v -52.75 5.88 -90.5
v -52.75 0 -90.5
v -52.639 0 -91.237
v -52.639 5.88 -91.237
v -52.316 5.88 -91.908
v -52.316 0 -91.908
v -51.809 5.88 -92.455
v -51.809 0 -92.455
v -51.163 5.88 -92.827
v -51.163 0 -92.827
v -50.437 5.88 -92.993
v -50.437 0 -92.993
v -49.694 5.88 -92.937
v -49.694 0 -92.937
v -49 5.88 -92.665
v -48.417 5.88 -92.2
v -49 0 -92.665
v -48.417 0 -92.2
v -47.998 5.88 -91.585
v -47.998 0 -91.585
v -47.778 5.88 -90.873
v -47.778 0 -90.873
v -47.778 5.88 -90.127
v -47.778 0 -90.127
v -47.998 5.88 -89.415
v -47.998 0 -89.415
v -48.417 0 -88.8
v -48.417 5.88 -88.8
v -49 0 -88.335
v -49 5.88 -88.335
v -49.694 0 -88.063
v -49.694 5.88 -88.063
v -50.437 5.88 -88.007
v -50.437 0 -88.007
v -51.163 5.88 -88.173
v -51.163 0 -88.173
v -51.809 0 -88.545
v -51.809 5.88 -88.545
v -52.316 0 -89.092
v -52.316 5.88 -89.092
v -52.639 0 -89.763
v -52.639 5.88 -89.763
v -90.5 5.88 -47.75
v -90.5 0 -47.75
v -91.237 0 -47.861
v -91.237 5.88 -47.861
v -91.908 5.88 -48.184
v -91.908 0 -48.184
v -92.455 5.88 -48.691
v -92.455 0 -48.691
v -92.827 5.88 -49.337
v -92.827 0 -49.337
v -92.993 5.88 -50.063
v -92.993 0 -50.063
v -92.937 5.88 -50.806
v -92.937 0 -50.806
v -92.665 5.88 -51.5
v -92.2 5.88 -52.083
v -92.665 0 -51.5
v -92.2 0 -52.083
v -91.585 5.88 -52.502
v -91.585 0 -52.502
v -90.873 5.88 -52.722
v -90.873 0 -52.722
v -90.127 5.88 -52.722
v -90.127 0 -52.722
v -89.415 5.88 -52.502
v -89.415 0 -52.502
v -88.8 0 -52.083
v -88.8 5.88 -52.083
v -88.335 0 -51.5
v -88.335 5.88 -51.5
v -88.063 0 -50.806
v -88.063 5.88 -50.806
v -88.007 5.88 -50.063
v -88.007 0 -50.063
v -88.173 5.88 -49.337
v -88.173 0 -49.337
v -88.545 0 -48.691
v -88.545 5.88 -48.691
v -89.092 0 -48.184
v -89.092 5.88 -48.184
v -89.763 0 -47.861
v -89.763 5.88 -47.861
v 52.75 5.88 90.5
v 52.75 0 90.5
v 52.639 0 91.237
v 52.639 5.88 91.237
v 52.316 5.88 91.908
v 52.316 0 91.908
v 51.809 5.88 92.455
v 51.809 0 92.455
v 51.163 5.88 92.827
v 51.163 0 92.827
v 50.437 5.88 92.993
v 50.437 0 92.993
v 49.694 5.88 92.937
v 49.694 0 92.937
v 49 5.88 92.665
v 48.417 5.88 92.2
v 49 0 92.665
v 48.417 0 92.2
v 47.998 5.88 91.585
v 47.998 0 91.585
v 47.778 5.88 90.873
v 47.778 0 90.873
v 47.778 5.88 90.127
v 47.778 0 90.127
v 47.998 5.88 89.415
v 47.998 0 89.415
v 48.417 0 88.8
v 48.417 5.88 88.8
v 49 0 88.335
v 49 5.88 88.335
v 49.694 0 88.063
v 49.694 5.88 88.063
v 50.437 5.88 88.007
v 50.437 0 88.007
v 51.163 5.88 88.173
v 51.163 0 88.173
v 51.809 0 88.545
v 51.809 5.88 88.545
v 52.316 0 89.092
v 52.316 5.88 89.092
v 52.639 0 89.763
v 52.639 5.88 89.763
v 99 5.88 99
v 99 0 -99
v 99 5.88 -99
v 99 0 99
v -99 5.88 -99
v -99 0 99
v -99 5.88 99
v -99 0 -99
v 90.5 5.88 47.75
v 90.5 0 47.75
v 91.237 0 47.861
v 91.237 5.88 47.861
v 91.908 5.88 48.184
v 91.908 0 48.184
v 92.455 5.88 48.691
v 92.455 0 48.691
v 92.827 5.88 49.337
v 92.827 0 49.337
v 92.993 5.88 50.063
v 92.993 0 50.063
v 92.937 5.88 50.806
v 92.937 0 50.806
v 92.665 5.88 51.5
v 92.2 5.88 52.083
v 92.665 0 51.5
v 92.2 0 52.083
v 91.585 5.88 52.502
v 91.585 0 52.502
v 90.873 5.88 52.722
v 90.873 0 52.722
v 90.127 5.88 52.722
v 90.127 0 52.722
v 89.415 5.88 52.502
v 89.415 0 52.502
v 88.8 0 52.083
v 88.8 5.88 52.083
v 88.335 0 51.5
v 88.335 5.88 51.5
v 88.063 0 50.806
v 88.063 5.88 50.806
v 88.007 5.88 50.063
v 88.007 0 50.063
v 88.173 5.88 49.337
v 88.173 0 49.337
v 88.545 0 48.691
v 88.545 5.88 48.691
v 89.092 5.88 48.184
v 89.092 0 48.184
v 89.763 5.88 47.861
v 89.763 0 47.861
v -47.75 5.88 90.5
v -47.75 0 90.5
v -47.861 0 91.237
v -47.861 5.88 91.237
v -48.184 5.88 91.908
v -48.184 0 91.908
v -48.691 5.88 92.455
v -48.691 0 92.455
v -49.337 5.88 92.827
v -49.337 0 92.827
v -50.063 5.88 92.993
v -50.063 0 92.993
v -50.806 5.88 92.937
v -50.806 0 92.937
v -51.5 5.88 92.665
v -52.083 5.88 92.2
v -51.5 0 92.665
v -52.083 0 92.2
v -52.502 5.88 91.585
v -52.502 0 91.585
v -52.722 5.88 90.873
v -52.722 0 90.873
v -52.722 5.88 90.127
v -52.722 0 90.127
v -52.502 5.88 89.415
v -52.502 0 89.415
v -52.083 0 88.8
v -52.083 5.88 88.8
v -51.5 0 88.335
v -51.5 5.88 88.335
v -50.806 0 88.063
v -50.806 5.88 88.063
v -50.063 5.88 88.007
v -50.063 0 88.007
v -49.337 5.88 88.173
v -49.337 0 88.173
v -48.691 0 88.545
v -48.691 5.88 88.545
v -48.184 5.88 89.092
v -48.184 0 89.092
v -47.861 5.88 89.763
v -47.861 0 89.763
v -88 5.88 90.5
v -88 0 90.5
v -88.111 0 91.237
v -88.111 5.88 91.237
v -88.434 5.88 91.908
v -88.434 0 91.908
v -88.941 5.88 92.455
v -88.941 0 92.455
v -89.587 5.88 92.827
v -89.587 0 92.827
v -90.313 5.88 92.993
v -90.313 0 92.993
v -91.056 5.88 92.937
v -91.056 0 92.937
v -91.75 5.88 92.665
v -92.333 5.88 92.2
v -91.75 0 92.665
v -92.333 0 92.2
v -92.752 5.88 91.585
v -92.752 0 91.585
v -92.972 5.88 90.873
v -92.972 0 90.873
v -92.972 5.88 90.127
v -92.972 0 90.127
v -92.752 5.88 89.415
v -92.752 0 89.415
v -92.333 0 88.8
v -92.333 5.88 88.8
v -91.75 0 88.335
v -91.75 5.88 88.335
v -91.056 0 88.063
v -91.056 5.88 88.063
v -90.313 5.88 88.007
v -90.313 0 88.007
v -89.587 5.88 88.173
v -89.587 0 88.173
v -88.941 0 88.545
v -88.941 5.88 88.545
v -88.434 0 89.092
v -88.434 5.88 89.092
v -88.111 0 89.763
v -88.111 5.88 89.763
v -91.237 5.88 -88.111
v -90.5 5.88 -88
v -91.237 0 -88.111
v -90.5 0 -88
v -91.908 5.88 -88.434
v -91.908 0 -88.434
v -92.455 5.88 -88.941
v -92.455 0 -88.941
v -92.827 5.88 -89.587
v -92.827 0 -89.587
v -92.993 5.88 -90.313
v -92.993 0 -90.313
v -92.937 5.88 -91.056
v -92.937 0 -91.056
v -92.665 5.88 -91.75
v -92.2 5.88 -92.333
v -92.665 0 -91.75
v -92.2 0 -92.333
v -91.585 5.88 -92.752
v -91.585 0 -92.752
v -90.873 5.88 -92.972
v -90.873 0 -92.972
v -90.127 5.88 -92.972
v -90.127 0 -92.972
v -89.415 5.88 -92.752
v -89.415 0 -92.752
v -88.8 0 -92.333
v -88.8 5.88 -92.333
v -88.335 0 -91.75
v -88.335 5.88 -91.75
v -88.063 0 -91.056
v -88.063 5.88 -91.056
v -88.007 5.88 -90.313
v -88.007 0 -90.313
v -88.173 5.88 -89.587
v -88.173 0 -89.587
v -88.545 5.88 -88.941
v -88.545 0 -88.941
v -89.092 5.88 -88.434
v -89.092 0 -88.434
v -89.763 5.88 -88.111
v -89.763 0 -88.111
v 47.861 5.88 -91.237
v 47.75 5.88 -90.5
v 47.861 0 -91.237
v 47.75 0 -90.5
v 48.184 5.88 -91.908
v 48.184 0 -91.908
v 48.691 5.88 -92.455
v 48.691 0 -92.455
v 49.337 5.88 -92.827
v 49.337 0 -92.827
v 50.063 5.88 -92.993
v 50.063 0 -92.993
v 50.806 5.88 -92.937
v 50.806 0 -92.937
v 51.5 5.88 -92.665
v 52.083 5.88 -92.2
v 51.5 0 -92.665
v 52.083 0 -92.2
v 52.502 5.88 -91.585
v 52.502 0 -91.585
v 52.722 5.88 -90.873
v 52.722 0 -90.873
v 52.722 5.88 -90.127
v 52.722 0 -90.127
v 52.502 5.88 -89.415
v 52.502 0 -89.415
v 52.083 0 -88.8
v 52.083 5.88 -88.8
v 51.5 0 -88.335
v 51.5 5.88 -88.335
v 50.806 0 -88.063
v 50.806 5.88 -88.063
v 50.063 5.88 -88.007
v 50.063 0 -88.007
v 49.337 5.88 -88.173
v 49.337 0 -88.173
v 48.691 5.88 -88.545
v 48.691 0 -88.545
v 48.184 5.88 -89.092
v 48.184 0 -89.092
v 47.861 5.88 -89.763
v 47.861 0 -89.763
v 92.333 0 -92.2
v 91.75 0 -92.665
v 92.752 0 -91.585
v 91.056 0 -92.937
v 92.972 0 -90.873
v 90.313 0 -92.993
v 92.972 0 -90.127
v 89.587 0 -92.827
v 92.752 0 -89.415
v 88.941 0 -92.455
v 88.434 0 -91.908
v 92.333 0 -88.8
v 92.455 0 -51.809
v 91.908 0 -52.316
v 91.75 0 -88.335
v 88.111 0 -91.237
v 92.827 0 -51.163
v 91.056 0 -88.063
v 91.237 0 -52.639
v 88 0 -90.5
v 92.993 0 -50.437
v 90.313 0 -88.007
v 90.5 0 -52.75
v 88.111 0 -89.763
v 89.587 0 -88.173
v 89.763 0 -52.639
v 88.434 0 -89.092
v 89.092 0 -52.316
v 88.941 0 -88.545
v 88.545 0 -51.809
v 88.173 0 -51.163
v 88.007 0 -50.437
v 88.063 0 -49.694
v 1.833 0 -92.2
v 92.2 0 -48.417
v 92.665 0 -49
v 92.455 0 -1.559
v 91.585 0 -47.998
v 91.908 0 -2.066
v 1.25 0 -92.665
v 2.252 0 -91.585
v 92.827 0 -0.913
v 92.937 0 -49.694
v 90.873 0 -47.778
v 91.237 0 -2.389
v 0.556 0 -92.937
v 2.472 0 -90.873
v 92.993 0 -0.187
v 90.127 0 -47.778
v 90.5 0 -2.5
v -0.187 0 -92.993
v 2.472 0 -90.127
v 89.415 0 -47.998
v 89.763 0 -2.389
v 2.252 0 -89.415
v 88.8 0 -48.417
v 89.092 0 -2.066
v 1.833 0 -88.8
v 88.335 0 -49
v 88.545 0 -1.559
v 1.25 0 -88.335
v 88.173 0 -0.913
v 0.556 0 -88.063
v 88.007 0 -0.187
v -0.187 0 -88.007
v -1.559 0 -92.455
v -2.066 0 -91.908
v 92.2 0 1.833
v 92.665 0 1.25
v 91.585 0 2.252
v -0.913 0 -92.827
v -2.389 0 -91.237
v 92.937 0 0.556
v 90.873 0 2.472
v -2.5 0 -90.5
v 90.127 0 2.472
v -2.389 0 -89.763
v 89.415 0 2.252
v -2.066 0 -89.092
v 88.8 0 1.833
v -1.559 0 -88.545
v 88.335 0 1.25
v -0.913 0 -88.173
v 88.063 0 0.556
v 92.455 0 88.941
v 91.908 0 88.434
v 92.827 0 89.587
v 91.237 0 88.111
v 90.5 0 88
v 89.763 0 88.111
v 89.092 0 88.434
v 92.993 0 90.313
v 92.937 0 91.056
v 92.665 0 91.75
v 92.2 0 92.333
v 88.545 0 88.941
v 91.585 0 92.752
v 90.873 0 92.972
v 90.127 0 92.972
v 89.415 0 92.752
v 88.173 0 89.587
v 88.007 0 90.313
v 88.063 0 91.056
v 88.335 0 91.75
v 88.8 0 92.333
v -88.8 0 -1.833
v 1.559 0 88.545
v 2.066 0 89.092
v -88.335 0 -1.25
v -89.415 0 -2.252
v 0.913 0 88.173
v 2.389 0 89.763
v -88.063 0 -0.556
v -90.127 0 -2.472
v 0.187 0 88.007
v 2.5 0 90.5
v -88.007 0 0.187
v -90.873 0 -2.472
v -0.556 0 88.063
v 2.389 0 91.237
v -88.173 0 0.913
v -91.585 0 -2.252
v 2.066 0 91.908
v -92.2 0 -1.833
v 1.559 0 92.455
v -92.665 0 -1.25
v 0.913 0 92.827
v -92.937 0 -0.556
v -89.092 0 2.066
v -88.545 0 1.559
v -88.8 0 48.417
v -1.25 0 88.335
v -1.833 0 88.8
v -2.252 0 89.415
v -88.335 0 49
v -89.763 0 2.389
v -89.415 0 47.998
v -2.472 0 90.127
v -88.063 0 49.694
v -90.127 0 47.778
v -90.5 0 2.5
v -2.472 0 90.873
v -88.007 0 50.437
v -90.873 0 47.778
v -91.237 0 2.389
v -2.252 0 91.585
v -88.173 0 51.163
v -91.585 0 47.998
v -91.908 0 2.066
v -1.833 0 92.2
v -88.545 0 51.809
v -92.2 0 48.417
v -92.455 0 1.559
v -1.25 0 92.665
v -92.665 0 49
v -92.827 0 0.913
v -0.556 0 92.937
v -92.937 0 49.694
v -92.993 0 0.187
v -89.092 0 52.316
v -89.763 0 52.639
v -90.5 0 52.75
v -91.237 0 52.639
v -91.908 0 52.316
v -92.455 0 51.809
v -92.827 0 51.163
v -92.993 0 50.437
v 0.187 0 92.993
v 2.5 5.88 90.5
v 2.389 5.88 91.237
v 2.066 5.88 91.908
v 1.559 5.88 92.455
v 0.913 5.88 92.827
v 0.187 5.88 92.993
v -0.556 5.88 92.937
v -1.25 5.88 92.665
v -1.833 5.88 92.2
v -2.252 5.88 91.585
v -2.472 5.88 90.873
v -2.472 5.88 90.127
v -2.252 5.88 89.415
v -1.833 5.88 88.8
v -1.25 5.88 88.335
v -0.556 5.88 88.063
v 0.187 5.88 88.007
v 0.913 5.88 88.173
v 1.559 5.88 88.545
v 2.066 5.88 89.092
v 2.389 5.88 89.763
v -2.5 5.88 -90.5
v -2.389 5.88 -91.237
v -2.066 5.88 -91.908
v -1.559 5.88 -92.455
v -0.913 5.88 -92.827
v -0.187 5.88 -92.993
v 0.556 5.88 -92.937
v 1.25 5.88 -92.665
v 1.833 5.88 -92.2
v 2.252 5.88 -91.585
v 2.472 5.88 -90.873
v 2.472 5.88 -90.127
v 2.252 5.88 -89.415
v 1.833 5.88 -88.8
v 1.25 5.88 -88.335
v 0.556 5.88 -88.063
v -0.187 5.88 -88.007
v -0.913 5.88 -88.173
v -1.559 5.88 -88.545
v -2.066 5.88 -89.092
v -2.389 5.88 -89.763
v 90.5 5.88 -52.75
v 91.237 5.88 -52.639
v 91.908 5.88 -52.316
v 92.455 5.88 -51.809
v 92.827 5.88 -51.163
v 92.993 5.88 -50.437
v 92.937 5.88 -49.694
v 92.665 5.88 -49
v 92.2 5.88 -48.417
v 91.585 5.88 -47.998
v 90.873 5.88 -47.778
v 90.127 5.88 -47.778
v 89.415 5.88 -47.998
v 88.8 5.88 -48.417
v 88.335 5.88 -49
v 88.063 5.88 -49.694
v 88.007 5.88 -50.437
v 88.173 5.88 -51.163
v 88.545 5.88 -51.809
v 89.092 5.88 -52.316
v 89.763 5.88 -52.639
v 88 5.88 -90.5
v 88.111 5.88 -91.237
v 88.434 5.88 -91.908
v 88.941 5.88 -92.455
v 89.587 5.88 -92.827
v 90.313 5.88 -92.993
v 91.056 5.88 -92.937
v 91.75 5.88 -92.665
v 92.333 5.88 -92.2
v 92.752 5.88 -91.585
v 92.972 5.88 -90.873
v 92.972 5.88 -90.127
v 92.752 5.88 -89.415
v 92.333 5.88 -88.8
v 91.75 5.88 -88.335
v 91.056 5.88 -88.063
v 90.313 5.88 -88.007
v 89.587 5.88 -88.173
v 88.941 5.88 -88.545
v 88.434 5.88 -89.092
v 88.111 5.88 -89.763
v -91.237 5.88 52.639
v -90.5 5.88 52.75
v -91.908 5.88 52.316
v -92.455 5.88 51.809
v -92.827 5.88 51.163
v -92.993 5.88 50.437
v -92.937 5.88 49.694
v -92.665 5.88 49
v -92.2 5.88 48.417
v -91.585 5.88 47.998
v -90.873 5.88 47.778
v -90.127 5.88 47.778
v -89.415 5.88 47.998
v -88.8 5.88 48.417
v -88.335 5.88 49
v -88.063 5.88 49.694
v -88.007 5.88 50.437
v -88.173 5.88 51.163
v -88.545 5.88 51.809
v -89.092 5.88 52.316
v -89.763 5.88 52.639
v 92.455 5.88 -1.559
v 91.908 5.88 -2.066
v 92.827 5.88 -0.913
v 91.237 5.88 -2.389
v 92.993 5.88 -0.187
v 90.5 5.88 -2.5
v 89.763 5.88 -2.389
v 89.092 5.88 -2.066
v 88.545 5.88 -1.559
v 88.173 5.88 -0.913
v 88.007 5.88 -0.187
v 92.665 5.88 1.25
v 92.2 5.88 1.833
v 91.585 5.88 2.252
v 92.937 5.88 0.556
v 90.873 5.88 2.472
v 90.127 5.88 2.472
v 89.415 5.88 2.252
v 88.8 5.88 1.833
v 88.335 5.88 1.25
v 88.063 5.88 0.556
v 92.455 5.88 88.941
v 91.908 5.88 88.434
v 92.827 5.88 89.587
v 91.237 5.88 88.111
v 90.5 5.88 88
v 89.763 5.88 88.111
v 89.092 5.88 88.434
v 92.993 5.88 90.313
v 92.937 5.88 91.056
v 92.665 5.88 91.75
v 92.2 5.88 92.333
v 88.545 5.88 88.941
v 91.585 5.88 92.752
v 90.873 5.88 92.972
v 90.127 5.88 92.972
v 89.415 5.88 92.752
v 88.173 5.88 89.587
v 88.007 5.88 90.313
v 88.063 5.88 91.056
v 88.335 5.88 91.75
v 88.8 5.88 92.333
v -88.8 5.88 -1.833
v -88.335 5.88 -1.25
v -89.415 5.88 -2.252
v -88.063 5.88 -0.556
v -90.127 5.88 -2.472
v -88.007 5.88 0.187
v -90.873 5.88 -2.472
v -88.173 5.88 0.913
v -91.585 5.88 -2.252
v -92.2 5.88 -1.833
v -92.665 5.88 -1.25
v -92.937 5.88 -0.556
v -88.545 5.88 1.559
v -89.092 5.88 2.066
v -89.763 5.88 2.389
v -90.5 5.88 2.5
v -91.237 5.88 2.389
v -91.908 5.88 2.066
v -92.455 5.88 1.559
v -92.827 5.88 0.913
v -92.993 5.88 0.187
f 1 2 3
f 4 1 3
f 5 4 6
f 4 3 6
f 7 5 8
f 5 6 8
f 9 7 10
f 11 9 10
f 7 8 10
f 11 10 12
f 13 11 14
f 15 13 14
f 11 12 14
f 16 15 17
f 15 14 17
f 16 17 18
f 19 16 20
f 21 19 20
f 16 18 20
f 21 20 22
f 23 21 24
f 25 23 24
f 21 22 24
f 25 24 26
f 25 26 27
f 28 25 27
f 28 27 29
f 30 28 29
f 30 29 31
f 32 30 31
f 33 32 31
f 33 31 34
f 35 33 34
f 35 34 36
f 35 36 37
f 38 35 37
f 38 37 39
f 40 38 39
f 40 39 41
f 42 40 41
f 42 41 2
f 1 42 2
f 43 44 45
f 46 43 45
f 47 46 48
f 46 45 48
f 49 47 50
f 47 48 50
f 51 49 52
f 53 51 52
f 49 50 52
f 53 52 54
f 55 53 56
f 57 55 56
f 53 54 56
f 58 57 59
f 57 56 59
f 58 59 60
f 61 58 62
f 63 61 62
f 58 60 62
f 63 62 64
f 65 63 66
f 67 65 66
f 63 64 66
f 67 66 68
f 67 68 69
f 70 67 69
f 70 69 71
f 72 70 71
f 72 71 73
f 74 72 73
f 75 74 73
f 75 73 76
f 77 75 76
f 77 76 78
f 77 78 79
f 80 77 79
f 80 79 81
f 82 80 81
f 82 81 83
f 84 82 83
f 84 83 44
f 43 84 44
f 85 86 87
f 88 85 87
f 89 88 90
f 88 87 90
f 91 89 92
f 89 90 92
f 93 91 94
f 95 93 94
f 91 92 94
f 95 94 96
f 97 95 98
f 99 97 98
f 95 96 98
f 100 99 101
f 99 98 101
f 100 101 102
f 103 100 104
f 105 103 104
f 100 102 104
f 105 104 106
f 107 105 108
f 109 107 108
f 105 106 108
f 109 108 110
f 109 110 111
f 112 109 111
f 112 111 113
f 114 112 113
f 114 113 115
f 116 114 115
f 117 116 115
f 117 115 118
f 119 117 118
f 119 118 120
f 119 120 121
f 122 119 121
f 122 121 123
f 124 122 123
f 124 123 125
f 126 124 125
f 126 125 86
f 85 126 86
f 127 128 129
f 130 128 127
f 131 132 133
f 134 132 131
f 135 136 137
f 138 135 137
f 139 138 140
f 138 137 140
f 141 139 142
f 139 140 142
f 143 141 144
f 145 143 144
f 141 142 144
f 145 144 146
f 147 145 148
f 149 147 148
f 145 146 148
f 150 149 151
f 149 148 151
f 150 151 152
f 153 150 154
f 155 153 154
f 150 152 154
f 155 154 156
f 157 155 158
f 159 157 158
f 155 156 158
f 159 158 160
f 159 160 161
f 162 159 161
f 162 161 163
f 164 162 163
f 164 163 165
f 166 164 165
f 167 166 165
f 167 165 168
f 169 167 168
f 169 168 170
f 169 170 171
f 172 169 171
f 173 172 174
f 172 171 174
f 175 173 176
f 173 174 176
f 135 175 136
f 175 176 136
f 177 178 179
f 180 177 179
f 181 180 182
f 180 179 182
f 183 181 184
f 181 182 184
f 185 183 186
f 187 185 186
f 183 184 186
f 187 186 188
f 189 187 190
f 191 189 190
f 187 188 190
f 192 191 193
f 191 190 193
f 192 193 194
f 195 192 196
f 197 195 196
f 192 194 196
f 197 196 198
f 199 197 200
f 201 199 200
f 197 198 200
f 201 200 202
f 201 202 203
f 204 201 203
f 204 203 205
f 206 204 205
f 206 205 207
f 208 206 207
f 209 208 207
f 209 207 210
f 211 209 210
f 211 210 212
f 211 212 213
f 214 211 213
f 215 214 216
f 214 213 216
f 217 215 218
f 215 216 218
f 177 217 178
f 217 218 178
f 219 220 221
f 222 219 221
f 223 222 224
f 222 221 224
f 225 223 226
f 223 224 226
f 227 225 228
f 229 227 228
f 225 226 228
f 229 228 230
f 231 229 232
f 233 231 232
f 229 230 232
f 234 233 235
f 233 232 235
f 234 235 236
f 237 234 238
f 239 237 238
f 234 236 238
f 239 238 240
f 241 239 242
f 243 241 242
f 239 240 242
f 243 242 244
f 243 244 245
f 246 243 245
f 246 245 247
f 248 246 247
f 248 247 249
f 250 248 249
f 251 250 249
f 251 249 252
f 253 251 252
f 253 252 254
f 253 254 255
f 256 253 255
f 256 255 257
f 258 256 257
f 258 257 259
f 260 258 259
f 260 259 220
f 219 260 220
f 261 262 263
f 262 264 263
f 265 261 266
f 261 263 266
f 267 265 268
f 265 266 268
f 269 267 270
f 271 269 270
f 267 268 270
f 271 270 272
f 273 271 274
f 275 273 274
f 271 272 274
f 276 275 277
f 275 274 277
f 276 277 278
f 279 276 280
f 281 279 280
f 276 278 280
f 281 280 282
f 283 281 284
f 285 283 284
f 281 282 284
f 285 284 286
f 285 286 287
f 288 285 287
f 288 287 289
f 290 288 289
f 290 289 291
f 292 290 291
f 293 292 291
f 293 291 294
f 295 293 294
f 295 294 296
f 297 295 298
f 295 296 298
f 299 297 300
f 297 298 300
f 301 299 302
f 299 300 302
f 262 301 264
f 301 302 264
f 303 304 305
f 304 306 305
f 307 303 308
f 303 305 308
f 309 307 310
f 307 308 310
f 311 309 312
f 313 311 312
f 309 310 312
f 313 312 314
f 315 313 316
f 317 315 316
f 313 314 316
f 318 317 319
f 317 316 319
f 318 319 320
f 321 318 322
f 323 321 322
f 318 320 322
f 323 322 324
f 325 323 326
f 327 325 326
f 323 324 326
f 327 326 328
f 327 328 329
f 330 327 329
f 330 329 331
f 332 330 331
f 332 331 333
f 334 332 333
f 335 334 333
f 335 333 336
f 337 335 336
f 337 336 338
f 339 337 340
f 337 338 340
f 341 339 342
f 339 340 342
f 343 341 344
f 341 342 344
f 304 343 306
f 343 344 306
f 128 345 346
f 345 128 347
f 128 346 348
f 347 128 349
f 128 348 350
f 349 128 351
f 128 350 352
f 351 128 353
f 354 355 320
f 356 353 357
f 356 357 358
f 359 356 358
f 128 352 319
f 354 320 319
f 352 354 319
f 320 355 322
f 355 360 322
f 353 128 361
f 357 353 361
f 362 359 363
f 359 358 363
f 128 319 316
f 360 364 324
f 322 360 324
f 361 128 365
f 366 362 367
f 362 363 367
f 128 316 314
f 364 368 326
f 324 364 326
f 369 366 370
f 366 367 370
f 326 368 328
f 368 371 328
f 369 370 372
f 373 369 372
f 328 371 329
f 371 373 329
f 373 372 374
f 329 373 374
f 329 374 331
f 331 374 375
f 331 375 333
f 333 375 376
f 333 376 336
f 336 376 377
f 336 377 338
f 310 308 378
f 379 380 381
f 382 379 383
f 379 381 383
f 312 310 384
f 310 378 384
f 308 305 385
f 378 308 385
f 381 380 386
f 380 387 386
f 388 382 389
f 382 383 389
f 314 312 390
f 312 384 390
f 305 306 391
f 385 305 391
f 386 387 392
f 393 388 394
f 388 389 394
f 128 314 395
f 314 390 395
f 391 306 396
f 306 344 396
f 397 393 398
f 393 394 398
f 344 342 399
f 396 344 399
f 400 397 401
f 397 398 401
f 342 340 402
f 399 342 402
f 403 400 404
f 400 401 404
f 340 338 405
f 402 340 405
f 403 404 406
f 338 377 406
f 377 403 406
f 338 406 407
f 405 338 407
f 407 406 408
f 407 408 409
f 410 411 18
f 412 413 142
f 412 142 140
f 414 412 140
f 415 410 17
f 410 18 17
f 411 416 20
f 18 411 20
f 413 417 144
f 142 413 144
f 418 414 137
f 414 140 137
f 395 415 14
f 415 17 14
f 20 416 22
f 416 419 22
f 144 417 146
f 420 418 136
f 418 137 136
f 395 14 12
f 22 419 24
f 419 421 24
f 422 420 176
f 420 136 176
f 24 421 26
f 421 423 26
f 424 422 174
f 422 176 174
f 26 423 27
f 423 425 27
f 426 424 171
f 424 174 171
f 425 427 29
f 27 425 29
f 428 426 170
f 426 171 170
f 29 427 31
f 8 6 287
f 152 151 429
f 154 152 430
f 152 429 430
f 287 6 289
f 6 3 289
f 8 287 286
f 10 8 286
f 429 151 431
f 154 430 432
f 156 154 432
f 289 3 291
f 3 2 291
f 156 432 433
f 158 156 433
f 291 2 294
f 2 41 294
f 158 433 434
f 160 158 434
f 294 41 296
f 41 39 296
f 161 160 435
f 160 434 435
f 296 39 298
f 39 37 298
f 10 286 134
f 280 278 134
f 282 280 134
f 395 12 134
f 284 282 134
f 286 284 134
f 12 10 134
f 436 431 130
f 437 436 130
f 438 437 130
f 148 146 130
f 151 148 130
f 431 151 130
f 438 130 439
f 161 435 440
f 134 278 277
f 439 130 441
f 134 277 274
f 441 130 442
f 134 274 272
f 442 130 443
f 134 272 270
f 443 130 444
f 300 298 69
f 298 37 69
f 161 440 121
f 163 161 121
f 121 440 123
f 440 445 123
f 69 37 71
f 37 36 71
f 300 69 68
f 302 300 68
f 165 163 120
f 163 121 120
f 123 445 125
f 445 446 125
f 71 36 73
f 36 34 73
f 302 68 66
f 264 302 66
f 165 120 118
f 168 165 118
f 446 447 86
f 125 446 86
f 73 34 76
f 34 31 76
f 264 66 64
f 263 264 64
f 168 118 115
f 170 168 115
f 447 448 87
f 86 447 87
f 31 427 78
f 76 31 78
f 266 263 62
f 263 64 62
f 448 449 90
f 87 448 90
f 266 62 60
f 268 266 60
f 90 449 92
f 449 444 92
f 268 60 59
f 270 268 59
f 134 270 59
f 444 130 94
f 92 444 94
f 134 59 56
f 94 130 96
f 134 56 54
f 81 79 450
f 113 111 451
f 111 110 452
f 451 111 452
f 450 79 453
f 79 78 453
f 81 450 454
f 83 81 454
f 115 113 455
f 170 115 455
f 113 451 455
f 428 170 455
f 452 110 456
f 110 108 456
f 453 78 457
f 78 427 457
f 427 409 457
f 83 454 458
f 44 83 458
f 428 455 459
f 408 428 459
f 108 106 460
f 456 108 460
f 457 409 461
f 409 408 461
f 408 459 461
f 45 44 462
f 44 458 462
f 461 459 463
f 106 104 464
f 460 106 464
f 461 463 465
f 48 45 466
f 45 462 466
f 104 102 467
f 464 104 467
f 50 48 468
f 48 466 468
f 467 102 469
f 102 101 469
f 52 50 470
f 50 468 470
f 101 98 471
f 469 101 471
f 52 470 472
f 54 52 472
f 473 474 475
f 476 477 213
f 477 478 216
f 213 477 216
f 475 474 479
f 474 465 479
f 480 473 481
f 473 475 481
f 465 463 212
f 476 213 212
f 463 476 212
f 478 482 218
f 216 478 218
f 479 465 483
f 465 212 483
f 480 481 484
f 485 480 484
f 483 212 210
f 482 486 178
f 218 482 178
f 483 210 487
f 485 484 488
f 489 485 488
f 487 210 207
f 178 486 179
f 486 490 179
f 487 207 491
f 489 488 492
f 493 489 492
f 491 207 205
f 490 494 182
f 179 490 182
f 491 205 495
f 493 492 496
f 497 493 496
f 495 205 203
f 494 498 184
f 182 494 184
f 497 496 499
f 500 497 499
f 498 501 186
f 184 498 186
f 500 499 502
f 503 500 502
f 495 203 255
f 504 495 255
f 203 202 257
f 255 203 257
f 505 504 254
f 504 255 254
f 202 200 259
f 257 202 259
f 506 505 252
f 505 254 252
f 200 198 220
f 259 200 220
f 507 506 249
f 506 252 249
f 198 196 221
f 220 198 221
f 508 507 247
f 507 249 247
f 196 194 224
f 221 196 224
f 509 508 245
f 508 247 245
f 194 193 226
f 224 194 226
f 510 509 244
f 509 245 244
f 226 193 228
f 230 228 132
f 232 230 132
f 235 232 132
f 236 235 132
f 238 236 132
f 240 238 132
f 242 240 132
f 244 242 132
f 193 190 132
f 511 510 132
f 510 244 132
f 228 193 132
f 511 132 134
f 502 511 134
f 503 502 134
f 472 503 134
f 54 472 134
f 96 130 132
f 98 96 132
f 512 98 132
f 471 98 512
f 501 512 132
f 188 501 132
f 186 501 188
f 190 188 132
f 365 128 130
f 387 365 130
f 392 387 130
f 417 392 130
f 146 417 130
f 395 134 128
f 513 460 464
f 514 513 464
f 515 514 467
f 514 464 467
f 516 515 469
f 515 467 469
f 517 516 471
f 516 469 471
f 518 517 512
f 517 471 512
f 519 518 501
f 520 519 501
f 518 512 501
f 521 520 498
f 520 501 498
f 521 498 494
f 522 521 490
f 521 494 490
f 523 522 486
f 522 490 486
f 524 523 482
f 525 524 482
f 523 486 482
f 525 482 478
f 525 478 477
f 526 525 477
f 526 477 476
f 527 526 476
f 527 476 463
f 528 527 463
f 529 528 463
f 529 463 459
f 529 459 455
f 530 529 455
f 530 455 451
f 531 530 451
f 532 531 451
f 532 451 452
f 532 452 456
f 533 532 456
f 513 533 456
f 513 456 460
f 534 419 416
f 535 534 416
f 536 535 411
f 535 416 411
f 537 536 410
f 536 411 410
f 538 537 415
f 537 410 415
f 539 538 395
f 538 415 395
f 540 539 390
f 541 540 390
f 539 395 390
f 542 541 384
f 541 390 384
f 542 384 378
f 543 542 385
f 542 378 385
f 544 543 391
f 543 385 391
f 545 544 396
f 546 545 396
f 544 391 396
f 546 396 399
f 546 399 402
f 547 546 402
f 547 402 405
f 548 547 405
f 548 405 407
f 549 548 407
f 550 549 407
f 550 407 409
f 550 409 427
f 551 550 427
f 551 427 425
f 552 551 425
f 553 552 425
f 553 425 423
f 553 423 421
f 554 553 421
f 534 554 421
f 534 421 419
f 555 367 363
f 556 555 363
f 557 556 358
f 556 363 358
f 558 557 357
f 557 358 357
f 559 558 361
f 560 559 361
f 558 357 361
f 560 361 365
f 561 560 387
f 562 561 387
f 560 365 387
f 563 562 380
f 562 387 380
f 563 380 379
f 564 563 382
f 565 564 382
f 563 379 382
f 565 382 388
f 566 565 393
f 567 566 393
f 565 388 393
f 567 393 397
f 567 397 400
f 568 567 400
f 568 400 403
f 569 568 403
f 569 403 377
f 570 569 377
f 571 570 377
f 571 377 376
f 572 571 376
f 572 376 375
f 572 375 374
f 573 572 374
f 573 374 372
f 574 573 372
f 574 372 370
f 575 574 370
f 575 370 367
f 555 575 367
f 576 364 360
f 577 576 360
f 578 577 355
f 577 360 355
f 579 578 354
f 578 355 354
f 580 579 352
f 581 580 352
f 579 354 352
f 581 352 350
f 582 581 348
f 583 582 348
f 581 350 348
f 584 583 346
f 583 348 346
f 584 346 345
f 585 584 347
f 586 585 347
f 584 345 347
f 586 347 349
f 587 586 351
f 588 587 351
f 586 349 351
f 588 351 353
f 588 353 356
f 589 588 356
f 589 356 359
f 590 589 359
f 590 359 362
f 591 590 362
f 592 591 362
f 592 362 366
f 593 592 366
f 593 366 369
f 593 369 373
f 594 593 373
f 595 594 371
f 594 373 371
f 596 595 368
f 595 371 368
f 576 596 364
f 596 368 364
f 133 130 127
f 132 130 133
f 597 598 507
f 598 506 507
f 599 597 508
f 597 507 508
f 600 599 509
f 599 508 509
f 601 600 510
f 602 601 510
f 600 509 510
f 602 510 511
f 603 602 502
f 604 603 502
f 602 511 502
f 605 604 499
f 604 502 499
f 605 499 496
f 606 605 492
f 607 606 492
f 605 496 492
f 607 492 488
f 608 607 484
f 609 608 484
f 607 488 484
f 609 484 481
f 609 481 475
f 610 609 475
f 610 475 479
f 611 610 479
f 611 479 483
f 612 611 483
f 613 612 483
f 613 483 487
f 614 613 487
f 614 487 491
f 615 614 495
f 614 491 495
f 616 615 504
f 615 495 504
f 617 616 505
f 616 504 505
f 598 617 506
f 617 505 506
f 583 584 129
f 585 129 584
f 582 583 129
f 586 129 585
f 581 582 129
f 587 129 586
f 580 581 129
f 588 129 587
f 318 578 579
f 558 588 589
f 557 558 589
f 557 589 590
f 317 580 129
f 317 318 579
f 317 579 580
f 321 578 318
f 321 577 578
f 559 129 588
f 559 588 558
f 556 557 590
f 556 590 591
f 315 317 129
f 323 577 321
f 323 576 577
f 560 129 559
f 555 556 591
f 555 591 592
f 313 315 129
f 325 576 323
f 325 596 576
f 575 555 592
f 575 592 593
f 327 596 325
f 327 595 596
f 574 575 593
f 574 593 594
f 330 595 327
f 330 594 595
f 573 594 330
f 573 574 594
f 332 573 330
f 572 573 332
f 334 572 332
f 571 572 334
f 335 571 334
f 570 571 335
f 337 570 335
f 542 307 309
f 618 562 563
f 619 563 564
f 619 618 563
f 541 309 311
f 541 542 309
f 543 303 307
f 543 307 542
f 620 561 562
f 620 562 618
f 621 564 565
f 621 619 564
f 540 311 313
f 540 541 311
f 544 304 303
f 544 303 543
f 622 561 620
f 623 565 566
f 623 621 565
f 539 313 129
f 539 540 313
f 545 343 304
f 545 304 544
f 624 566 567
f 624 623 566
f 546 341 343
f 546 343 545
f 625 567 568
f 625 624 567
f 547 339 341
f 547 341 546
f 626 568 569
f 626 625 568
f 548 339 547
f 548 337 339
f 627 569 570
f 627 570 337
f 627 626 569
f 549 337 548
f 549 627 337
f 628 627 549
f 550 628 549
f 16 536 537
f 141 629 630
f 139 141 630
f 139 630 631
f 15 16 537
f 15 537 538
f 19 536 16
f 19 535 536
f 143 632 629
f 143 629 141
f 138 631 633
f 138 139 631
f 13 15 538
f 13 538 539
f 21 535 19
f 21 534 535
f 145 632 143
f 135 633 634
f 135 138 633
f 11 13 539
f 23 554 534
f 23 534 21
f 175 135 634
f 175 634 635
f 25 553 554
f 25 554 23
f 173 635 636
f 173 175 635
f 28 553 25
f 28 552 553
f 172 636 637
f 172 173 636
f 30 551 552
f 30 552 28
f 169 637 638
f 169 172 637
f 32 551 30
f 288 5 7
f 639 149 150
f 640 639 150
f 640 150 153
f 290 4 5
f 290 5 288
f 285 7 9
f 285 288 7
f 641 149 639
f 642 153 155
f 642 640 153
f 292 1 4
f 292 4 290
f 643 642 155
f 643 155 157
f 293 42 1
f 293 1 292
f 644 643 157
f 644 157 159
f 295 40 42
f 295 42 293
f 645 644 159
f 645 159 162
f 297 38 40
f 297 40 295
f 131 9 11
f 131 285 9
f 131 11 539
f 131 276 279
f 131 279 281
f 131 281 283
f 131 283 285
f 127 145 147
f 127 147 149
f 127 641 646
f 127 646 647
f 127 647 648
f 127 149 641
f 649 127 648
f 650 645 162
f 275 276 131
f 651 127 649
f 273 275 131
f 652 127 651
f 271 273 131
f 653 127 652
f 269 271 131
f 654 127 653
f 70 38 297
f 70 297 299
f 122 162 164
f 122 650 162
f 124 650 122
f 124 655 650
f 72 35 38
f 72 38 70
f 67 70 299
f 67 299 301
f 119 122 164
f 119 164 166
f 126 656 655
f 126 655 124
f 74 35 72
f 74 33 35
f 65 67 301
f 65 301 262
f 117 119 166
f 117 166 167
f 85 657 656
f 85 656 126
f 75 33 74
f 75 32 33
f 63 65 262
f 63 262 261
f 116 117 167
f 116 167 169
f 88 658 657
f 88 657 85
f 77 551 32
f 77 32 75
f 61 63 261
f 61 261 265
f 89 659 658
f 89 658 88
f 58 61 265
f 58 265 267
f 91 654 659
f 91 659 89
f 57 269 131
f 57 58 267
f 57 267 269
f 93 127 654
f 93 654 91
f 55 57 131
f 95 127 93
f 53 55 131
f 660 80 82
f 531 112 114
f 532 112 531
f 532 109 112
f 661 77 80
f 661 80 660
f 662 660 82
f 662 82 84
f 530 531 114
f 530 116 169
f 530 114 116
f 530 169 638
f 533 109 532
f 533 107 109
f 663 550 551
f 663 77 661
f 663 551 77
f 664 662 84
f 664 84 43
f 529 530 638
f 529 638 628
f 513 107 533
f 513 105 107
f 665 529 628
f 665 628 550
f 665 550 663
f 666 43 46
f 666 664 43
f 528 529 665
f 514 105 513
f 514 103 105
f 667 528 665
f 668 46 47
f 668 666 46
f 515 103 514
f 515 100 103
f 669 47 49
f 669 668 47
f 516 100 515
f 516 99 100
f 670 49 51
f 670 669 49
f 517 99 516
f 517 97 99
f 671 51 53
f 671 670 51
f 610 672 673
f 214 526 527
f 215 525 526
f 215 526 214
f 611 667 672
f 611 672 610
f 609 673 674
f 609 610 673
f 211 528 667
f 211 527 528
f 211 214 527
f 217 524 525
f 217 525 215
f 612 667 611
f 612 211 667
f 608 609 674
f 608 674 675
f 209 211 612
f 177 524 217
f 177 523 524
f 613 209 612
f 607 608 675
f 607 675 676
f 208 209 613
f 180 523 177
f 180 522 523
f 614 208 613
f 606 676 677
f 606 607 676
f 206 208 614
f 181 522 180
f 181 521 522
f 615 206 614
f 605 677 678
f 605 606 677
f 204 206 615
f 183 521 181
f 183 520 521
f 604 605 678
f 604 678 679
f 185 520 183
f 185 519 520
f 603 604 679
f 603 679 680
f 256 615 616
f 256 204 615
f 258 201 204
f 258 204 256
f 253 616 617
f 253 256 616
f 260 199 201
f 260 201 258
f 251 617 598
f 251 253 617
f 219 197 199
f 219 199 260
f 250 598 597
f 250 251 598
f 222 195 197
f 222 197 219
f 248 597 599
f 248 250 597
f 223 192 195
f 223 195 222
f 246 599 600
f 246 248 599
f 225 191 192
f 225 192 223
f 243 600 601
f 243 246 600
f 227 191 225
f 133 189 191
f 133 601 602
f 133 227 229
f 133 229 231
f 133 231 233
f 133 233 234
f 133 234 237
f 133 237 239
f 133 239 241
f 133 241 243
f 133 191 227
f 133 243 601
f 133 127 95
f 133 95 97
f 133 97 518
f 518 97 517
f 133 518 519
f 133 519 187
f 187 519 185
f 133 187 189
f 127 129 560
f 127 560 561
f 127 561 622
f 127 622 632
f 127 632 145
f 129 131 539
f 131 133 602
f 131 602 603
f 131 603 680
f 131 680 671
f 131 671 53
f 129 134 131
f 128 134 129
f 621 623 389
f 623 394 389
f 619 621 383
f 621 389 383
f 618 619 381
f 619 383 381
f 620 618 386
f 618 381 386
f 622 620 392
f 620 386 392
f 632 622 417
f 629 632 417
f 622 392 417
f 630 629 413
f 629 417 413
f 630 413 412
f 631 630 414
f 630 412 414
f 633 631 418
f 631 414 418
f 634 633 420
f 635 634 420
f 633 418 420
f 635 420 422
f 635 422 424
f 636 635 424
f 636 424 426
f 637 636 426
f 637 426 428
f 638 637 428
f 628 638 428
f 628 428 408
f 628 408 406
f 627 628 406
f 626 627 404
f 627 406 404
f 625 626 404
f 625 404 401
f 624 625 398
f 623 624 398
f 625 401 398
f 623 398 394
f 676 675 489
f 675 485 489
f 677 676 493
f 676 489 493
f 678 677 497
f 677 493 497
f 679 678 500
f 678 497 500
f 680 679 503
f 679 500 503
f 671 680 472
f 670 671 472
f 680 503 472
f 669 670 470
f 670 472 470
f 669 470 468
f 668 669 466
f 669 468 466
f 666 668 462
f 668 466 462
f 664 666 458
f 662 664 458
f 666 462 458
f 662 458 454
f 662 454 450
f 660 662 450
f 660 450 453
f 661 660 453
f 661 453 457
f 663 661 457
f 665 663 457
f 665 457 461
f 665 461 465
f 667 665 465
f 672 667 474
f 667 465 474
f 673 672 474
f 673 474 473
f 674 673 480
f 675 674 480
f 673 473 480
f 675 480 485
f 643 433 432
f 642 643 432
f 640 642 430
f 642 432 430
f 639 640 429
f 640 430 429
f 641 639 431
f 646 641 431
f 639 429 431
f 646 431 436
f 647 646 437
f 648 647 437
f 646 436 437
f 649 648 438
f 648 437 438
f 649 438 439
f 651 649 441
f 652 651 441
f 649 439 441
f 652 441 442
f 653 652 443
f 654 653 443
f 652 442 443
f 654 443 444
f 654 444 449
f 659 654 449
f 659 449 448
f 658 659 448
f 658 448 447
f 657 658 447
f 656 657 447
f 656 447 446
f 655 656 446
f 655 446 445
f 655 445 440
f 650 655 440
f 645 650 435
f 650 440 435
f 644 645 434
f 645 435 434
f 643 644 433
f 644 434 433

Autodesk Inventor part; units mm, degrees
ref_plane "YZ Plane" through (0, 0, 0) normal (1, 0, 0) x (0, 1, 0)
ref_plane "XZ Plane" through (0, 0, 0) normal (0, 1, 0) x (-1, 0, 0)
ref_plane "XY Plane" through (0, 0, 0) normal (0, 0, 1) x (1, 0, 0)
sketch "Sketch1" plane through (0, 0, 0) normal (0, 1, 0) x (-1, 0, 0)
  line L0 (99, -99) -> (-99, -99)
  line L1 (-99, -99) -> (-99, 99)
  line L2 (-99, 99) -> (99, 99)
  line L3 (99, 99) -> (99, -99)
  line L4 (99, -99) -> (-99, 99) construction
  line L5 (-99, -99) -> (99, 99) construction
  point P0 (0, 0)
  dimension "d0" = 198
  dimension "d1" = 198
extrude "Extrusion1" add sketch "Sketch1" along normal blind 5.88
sketch "Sketch2" plane through (0, 5.88, 0) normal (0, 1, 0) x (1, 0, 0)
  circle A0 centre (-76.175, -76.175) radius 5
  line L0 (99, 99) -> (-99, 99) projected
  line L1 (-99, 99) -> (-99, -99) projected
  line L2 (82.175, -82.175) -> (-82.175, -82.175)
  line L3 (-82.175, -82.175) -> (-82.175, 82.175)
  line L4 (-82.175, 82.175) -> (82.175, 82.175)
  line L5 (82.175, 82.175) -> (82.175, -82.175)
  line L6 (82.175, -82.175) -> (-82.175, 82.175) construction
  line L7 (-82.175, -82.175) -> (82.175, 82.175) construction
  line L8 (75, -75) -> (-75, -75)
  line L9 (-75, -75) -> (-75, 75)
  line L10 (-75, 75) -> (75, 75)
  line L11 (75, 75) -> (75, -75)
  line L12 (75, -75) -> (-75, 75) construction
  line L13 (-75, -75) -> (75, 75) construction
  circle A1 centre (-76.175, -76.175) radius 6
  circle A2 centre (-90.5875, 62.75) radius 2.5
  line L14 (0, 0) -> (-75, 0)
  circle A3 centre (-90.5875, -62.75) radius 2.5
  circle A4 centre (-62.75, -90.5875) radius 2.5
  circle A5 centre (62.75, -90.5875) radius 2.5
  circle A6 centre (90.5875, -62.75) radius 2.5
  circle A7 centre (90.5875, 62.75) radius 2.5
  circle A8 centre (62.75, 90.5875) radius 2.5
  circle A9 centre (-62.75, 90.5875) radius 2.5
  dimension "d4" = 10
  dimension "d7" = 16.825
  dimension "d8" = 16.825
  dimension "d9" = 150
  dimension "d10" = 150
  dimension "d11" = 6
  dimension "d12" = 12
  dimension "d13" = 5
  dimension "d14" = 8.4125
  dimension "d15" = 62.75
  dimension "d18" = 360
extrude "Extrusion2" [suppressed]
sketch "Sketch4" plane through (0, 0, 0) normal (0, -1, 0) x (1, 0, 0)
  line L0 (-80.5, -80.5) -> (80.5, -80.5)
  line L1 (80.5, -80.5) -> (80.5, 80.5)
  line L2 (80.5, 80.5) -> (-80.5, 80.5)
  line L3 (-80.5, 80.5) -> (-80.5, -80.5)
  line L4 (-80.5, -80.5) -> (80.5, 80.5) construction
  line L5 (80.5, -80.5) -> (-80.5, 80.5) construction
  line L6 (-100.5, -100.5) -> (100.5, -100.5)
  line L7 (100.5, -100.5) -> (100.5, 100.5)
  line L8 (100.5, 100.5) -> (-100.5, 100.5)
  line L9 (-100.5, 100.5) -> (-100.5, -100.5)
  line L10 (-100.5, -100.5) -> (100.5, 100.5) construction
  line L11 (100.5, -100.5) -> (-100.5, 100.5) construction
  circle A0 centre (-50.25, 90.5) radius 2.5
  line L12 (0, 0) -> (0, 100.5)
  circle A1 centre (50.25, 90.5) radius 2.5
  circle A2 centre (-90.5, 90.5) radius 2.5
  circle A3 centre (0, 90.5) radius 2.5
  circle A4 centre (90.5, 90.5) radius 2.5
  point P0 (0, 0)
  dimension "d20" = 201
  dimension "d21" = 201
  dimension "d22" = 20
  dimension "d23" = 20
  dimension "d24" = 5
  dimension "d25" = 50.25
  dimension "d26" = 10
  dimension "d32" = 5
  dimension "d33" = 10
  dimension "d34" = 5
  dimension "d35" = 10
extrude "Extrusion3" cut sketch "Sketch4" against normal blind 10 contours A3 L12 | L12 A3 | A0 | A1 | A2
pattern_circular "Circular Pattern1" count 4 over 360 about axis through (0, -10, 0) along (0, 1, 0) of "Extrusion3"
equation "\"d2\" = thick_acrylic"
equation "\"d4\" = stopper_diameter"
equation "\"d7\" = reservoir_overlap - 2 * sm_thickness"
equation "\"d8\" = reservoir_overlap - 2 * sm_thickness"
equation "\"d9\" = bed_x"
equation "\"d10\" = bed_y"
equation "\"d13\" = m5_diameter"
equation "\"d14\" = -sm_thickness + 0.5 * reservoir_overlap"
equation "\"d15\" = 0.25 * tray_y"
equation "\"d5\" = thick_acrylic"
equation "\"d20\" = reservoir_x"
equation "\"d21\" = reservoir_y"
equation "\"d22\" = reservoir_overlap"
equation "\"d23\" = reservoir_overlap"
equation "\"d24\" = m5_diameter"
equation "\"d25\" = 0.25 * reservoir_x"
equation "\"d26\" = 0.5 * reservoir_overlap"
equation "\"d32\" = m5_diameter"
equation "\"d33\" = 0.5 * reservoir_overlap"
equation "\"d34\" = m5_diameter"
equation "\"d35\" = 0.5 * reservoir_overlap"
equation "\"sm_thickness\" = 1.5875"
equation "\"thick_acrylic\" = 5.88"
equation "\"thin_acrylic\" = 3.15"
equation "\"clear_acrylic\" = 3.15"
equation "\"wood_thickness\" = 6.72"
equation "\"m3_diameter\" = 3"
equation "\"m4_diameter\" = 4"
equation "\"m5_diameter\" = 5"
equation "\"brass_insert_drill\" = 4"
equation "\"m5_brass_insert_drill\" = 6.7"
equation "\"m3_main_length\" = 14"
equation "\"m3_main_nut_width\" = 5.7"
equation "\"m3_main_nut_thickness\" = 2.5"
equation "\"m3_main_extra\" = 1"
equation "\"stepper_screw_space\" = 35"
equation "\"stepper_shaft_diameter\" = 5"
equation "\"stepper_body_diameter\" = 28"
equation "\"laser_body_diameter\" = 12"
equation "\"t_carrier\" = 5.88"
equation "\"t_wall\" = 5.88"
equation "\"t_window\" = 3.15"
equation "\"carrier_y\" = 251"
equation "\"carrier_z\" = 12"
equation "\"carrier_z2\" = 25"
equation "\"protection_slot\" = 36.2"
equation "\"protection_slot_offset\" = 45.25"
equation "\"window_z\" = 332.225"
equation "\"window_y\" = 93.75"
equation "\"window_slot\" = 25"
equation "\"door_sensor\" = 35"
equation "\"reservoir_x\" = 201"
equation "\"reservoir_y\" = 201"
equation "\"reservoir_overlap\" = 20"
equation "\"linear_bearing_spacing\" = 271"
equation "\"motor_spacing\" = 337"
equation "\"t_tray\" = 3.15"
equation "\"tray_border\" = 25"
equation "\"tray_x\" = 251"
equation "\"tray_y\" = 251"
equation "\"bed_x\" = 150"
equation "\"bed_y\" = 150"
equation "\"stopper_diameter\" = 10"
equation "\"brass_keep_out\" = 8"
equation "\"tape_keep_out\" = 2"
equation "\"tape_thickness\" = 2"
equation "\"t_crane\" = 6.72"
equation "\"end_stop_spacing\" = 19"
equation "\"thumb_nut_offset_y\" = 0"
equation "\"thumb_nut_diameter\" = 7"
equation "\"z_min_from_center\" = 115"
equation "\"t_frame\" = 6.72"
equation "\"frame_top_z\" = 385"
equation "\"frame_bottom_z\" = 275"
equation "\"frame_total_z\" = 661.5875"
equation "\"frame_border\" = 48.0375"
equation "\"frame_foot_z\" = 12"
equation "\"frame_tilt\" = 1deg"
equation "\"printer_z\" = 289"
equation "\"lcd_x\" = 72"
equation "\"lcd_y\" = 25"
equation "\"subframe_x\" = 66"
equation "\"subframe_y_offset\" = 27.5"
equation "\"laser_y_offset\" = 19.4"
equation "\"laser_diameter\" = 12"
equation "\"laser_z_offset\" = 55"
equation "\"laser_y\" = 15"
equation "\"laser_z\" = 75"
equation "\"t_galvo_frame\" = 6.72"
equation "\"galvo_frame_x\" = 66"
equation "\"galvo_frame_z\" = 85"
equation "\"galvo_frame_y_offset\" = 27.5"
equation "\"drawer_x\" = 257.3"
equation "\"drawer_y\" = 90.3375"
equation "\"drawer_z\" = 278.175"
equation "\"drawer_z_from_bottom\" = 25"
equation "\"crane_z2\" = 12"
equation "\"bed_z\" = 25"
equation "\"nema17_x\" = 43"
equation "\"very_thick_acrylic\" = 9.45"
equation "\"m5_press_nut_drill\" = 6.5"
equation "\"visor_x\" = 253.925"
equation "\"m3_press_nut_drill\" = 4.5"
equation "\"window_overlap\" = 48"
equation "\"m5_head\" = 10.3"
equation "\"visor_y\" = 85.6"
equation "\"door_overlap\" = 48"
equation "\"door_z\" = 332.225"
equation "\"acrylic_into_frame\" = 5"
equation "\"m3_head\" = 6"
equation "\"door_x\" = 251"
equation "\"drawer_support_from_top\" = 48"
equation "\"laser_gap\" = 1"
equation "\"frame_screw_from_center\" = 25"
equation "\"drawer_screw_from_center\" = 55"
equation "\"frame_face_y\" = 45"
equation "\"switch_spacing\" = 19"
equation "\"subframe_y\" = 55"
equation "\"al_thickness\" = 1.5875"
equation "\"rivet_diameter\" = 3.3"
equation "\"bend_factor\" = 2.26205"
equation "\"sm_bend\" = 3.591"
equation "\"al_bend\" = 3.591"
equation "\"frame_x\" = 353.375"
equation "\"carrier_y2\" = 76.825"
properties part number "tray"
